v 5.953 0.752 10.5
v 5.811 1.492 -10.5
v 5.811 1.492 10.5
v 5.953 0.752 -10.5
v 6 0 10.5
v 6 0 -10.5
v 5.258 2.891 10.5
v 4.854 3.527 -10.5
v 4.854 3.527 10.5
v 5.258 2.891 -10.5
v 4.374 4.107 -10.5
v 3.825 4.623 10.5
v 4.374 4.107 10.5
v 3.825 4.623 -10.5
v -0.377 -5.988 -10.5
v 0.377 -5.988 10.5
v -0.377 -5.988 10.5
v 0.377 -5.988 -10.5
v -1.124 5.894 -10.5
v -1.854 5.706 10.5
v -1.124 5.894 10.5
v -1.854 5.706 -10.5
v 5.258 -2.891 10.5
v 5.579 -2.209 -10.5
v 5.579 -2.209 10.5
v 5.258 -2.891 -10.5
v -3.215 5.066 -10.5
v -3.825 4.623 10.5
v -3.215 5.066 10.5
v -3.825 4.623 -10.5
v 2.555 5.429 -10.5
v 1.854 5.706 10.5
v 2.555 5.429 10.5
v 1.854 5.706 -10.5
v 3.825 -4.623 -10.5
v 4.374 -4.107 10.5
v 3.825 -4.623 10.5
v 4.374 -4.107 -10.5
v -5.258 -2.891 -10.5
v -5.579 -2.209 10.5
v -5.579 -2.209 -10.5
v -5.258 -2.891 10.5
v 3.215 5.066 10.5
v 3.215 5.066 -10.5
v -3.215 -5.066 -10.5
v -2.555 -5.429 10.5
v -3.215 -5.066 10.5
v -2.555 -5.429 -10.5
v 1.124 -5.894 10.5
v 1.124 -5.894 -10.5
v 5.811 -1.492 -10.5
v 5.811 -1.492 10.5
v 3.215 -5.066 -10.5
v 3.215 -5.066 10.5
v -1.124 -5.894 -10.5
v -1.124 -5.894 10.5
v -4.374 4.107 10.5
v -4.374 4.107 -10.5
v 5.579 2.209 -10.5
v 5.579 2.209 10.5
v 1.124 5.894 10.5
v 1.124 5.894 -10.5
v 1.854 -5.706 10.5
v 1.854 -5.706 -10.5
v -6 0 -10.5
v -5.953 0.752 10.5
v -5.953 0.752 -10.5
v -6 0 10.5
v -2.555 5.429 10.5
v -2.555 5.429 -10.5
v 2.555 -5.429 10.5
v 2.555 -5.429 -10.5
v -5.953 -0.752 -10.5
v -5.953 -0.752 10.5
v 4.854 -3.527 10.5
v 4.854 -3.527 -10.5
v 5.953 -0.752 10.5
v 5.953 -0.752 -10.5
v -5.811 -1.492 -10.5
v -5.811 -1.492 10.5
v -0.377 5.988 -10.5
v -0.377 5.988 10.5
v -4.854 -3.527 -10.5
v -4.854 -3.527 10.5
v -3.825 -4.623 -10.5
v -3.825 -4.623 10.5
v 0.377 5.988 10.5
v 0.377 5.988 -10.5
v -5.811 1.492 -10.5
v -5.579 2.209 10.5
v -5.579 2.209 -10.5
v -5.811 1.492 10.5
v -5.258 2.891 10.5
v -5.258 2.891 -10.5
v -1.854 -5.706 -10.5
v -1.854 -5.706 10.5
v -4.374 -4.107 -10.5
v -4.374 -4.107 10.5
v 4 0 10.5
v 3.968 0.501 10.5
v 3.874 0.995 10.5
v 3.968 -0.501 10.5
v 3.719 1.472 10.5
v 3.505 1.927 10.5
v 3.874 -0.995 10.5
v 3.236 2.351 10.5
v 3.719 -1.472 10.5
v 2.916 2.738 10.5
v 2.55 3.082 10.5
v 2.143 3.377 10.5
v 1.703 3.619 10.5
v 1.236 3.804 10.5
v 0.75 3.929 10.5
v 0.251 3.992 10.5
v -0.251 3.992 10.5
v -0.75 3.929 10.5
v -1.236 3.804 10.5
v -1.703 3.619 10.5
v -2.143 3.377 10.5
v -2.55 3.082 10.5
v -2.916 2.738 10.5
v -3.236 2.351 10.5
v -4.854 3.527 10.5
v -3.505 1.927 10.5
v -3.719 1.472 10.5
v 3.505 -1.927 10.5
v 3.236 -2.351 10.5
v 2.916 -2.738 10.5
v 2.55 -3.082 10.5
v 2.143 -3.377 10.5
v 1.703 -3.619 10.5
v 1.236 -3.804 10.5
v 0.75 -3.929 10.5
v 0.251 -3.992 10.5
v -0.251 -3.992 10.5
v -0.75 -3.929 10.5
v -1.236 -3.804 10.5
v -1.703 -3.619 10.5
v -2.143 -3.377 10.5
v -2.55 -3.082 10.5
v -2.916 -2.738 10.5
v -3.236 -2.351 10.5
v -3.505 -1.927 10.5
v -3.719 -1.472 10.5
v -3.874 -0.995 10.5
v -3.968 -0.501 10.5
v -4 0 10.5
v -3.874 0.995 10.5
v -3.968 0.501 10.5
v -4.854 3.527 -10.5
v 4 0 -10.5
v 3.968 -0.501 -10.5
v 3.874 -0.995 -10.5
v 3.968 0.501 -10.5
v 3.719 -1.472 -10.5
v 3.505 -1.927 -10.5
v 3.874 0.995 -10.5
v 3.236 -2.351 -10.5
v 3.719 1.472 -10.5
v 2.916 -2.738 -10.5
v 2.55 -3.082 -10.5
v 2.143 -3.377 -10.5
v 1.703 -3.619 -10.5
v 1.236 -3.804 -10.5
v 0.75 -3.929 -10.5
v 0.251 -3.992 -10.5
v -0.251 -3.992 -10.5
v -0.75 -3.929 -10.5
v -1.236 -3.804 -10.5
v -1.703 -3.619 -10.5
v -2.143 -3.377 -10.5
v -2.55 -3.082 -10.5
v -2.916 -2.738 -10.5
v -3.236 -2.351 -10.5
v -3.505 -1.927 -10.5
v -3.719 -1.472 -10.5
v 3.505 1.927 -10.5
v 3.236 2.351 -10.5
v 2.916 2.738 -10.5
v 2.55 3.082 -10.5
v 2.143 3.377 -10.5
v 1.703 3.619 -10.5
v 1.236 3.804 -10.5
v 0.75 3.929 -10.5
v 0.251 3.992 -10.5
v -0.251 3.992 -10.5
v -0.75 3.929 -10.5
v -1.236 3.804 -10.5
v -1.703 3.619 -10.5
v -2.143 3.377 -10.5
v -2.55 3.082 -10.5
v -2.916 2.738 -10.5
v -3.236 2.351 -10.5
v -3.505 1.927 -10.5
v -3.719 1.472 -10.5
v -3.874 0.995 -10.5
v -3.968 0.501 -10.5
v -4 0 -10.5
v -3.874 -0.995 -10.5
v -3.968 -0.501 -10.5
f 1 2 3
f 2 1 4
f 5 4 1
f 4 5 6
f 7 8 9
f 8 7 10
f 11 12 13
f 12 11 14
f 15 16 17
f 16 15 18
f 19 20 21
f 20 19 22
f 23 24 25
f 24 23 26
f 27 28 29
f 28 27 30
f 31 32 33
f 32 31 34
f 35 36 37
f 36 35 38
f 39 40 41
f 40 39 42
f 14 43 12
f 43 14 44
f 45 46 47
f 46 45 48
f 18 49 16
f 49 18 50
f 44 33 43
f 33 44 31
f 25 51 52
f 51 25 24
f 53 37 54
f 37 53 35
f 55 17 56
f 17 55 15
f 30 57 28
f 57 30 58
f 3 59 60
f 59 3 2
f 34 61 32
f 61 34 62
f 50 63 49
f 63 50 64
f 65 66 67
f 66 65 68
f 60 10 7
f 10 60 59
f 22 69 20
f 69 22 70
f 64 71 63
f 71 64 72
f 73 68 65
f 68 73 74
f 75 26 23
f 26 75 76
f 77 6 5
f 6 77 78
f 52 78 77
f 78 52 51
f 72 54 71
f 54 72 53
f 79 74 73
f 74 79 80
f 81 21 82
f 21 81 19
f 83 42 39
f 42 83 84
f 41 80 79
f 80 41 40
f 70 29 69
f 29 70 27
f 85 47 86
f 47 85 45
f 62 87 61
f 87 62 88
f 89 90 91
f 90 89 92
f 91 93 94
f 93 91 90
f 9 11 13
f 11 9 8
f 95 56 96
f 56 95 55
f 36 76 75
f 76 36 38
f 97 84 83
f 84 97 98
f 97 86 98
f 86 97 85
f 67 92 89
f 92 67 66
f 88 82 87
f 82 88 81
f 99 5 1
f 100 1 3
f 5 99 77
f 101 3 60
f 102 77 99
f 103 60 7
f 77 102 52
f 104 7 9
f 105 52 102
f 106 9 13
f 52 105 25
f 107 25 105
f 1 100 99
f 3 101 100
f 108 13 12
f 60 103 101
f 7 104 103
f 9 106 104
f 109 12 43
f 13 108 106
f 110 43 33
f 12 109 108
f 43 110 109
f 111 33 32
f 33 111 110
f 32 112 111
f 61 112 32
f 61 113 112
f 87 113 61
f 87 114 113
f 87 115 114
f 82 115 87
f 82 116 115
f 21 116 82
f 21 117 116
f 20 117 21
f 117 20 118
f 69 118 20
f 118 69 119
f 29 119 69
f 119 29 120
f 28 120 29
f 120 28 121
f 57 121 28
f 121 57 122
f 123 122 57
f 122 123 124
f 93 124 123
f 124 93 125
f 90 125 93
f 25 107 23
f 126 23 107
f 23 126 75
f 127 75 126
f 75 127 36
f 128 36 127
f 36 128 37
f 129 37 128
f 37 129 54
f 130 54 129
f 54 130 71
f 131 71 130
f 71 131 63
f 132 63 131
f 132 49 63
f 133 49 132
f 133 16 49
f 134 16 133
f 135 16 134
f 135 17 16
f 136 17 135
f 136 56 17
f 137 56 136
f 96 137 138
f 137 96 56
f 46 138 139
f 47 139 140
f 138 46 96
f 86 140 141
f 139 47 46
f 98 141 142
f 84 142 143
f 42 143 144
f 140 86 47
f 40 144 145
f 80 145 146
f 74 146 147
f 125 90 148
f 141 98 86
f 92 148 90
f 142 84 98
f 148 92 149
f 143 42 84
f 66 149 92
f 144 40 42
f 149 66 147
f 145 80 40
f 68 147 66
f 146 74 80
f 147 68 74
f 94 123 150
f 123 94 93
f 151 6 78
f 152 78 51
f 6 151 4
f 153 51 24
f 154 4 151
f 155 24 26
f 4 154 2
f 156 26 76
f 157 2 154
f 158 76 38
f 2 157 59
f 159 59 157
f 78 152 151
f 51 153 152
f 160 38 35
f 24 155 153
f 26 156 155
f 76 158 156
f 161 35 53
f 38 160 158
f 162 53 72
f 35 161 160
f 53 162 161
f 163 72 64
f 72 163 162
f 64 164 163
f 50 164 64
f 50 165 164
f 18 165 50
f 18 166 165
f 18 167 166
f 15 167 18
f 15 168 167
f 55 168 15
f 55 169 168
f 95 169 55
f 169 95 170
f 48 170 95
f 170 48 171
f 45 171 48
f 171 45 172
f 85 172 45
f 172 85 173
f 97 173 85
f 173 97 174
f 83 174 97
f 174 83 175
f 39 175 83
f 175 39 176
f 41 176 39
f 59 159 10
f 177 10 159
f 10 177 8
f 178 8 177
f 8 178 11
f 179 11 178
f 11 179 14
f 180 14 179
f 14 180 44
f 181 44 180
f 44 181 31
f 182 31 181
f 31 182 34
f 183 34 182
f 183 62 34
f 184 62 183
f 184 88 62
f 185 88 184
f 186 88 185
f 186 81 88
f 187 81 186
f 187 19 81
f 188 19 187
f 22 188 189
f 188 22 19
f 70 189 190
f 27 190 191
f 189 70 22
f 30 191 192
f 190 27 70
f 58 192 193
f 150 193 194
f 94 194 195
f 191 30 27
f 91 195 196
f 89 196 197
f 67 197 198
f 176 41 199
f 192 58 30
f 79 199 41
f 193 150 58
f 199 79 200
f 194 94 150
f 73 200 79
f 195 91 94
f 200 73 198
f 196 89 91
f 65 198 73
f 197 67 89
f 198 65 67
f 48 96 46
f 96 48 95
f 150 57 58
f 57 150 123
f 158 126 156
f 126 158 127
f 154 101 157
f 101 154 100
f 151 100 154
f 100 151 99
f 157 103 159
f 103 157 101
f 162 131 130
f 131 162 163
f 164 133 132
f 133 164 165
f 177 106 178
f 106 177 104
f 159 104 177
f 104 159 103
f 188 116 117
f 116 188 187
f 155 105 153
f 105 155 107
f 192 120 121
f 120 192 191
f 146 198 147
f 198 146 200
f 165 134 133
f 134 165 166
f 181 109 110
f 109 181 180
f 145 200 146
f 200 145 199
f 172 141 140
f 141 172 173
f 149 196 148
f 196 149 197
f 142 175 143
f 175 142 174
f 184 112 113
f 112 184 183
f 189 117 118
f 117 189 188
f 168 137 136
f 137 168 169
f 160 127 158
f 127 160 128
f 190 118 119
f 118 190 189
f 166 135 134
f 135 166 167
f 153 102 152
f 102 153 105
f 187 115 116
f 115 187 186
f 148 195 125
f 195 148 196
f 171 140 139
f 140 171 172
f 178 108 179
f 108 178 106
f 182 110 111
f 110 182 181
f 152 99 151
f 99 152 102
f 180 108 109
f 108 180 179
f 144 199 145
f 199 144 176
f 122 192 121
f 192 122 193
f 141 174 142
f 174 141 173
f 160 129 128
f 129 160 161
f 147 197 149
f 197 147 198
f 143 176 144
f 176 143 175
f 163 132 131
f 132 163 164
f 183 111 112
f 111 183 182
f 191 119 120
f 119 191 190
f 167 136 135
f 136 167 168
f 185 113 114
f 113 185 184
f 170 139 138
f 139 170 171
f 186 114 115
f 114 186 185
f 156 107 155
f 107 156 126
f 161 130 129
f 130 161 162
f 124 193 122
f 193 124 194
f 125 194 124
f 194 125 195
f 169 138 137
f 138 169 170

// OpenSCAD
$fn = 50;


difference() {
	union() {
		translate(v = [0, 0, -10.5000000000]) {
			cylinder(h = 21, r = 6.0000000000);
		}
	}
	union() {
		translate(v = [0, 0, -100.0000000000]) {
			cylinder(h = 200, r = 4.0000000000);
		}
	}
}
